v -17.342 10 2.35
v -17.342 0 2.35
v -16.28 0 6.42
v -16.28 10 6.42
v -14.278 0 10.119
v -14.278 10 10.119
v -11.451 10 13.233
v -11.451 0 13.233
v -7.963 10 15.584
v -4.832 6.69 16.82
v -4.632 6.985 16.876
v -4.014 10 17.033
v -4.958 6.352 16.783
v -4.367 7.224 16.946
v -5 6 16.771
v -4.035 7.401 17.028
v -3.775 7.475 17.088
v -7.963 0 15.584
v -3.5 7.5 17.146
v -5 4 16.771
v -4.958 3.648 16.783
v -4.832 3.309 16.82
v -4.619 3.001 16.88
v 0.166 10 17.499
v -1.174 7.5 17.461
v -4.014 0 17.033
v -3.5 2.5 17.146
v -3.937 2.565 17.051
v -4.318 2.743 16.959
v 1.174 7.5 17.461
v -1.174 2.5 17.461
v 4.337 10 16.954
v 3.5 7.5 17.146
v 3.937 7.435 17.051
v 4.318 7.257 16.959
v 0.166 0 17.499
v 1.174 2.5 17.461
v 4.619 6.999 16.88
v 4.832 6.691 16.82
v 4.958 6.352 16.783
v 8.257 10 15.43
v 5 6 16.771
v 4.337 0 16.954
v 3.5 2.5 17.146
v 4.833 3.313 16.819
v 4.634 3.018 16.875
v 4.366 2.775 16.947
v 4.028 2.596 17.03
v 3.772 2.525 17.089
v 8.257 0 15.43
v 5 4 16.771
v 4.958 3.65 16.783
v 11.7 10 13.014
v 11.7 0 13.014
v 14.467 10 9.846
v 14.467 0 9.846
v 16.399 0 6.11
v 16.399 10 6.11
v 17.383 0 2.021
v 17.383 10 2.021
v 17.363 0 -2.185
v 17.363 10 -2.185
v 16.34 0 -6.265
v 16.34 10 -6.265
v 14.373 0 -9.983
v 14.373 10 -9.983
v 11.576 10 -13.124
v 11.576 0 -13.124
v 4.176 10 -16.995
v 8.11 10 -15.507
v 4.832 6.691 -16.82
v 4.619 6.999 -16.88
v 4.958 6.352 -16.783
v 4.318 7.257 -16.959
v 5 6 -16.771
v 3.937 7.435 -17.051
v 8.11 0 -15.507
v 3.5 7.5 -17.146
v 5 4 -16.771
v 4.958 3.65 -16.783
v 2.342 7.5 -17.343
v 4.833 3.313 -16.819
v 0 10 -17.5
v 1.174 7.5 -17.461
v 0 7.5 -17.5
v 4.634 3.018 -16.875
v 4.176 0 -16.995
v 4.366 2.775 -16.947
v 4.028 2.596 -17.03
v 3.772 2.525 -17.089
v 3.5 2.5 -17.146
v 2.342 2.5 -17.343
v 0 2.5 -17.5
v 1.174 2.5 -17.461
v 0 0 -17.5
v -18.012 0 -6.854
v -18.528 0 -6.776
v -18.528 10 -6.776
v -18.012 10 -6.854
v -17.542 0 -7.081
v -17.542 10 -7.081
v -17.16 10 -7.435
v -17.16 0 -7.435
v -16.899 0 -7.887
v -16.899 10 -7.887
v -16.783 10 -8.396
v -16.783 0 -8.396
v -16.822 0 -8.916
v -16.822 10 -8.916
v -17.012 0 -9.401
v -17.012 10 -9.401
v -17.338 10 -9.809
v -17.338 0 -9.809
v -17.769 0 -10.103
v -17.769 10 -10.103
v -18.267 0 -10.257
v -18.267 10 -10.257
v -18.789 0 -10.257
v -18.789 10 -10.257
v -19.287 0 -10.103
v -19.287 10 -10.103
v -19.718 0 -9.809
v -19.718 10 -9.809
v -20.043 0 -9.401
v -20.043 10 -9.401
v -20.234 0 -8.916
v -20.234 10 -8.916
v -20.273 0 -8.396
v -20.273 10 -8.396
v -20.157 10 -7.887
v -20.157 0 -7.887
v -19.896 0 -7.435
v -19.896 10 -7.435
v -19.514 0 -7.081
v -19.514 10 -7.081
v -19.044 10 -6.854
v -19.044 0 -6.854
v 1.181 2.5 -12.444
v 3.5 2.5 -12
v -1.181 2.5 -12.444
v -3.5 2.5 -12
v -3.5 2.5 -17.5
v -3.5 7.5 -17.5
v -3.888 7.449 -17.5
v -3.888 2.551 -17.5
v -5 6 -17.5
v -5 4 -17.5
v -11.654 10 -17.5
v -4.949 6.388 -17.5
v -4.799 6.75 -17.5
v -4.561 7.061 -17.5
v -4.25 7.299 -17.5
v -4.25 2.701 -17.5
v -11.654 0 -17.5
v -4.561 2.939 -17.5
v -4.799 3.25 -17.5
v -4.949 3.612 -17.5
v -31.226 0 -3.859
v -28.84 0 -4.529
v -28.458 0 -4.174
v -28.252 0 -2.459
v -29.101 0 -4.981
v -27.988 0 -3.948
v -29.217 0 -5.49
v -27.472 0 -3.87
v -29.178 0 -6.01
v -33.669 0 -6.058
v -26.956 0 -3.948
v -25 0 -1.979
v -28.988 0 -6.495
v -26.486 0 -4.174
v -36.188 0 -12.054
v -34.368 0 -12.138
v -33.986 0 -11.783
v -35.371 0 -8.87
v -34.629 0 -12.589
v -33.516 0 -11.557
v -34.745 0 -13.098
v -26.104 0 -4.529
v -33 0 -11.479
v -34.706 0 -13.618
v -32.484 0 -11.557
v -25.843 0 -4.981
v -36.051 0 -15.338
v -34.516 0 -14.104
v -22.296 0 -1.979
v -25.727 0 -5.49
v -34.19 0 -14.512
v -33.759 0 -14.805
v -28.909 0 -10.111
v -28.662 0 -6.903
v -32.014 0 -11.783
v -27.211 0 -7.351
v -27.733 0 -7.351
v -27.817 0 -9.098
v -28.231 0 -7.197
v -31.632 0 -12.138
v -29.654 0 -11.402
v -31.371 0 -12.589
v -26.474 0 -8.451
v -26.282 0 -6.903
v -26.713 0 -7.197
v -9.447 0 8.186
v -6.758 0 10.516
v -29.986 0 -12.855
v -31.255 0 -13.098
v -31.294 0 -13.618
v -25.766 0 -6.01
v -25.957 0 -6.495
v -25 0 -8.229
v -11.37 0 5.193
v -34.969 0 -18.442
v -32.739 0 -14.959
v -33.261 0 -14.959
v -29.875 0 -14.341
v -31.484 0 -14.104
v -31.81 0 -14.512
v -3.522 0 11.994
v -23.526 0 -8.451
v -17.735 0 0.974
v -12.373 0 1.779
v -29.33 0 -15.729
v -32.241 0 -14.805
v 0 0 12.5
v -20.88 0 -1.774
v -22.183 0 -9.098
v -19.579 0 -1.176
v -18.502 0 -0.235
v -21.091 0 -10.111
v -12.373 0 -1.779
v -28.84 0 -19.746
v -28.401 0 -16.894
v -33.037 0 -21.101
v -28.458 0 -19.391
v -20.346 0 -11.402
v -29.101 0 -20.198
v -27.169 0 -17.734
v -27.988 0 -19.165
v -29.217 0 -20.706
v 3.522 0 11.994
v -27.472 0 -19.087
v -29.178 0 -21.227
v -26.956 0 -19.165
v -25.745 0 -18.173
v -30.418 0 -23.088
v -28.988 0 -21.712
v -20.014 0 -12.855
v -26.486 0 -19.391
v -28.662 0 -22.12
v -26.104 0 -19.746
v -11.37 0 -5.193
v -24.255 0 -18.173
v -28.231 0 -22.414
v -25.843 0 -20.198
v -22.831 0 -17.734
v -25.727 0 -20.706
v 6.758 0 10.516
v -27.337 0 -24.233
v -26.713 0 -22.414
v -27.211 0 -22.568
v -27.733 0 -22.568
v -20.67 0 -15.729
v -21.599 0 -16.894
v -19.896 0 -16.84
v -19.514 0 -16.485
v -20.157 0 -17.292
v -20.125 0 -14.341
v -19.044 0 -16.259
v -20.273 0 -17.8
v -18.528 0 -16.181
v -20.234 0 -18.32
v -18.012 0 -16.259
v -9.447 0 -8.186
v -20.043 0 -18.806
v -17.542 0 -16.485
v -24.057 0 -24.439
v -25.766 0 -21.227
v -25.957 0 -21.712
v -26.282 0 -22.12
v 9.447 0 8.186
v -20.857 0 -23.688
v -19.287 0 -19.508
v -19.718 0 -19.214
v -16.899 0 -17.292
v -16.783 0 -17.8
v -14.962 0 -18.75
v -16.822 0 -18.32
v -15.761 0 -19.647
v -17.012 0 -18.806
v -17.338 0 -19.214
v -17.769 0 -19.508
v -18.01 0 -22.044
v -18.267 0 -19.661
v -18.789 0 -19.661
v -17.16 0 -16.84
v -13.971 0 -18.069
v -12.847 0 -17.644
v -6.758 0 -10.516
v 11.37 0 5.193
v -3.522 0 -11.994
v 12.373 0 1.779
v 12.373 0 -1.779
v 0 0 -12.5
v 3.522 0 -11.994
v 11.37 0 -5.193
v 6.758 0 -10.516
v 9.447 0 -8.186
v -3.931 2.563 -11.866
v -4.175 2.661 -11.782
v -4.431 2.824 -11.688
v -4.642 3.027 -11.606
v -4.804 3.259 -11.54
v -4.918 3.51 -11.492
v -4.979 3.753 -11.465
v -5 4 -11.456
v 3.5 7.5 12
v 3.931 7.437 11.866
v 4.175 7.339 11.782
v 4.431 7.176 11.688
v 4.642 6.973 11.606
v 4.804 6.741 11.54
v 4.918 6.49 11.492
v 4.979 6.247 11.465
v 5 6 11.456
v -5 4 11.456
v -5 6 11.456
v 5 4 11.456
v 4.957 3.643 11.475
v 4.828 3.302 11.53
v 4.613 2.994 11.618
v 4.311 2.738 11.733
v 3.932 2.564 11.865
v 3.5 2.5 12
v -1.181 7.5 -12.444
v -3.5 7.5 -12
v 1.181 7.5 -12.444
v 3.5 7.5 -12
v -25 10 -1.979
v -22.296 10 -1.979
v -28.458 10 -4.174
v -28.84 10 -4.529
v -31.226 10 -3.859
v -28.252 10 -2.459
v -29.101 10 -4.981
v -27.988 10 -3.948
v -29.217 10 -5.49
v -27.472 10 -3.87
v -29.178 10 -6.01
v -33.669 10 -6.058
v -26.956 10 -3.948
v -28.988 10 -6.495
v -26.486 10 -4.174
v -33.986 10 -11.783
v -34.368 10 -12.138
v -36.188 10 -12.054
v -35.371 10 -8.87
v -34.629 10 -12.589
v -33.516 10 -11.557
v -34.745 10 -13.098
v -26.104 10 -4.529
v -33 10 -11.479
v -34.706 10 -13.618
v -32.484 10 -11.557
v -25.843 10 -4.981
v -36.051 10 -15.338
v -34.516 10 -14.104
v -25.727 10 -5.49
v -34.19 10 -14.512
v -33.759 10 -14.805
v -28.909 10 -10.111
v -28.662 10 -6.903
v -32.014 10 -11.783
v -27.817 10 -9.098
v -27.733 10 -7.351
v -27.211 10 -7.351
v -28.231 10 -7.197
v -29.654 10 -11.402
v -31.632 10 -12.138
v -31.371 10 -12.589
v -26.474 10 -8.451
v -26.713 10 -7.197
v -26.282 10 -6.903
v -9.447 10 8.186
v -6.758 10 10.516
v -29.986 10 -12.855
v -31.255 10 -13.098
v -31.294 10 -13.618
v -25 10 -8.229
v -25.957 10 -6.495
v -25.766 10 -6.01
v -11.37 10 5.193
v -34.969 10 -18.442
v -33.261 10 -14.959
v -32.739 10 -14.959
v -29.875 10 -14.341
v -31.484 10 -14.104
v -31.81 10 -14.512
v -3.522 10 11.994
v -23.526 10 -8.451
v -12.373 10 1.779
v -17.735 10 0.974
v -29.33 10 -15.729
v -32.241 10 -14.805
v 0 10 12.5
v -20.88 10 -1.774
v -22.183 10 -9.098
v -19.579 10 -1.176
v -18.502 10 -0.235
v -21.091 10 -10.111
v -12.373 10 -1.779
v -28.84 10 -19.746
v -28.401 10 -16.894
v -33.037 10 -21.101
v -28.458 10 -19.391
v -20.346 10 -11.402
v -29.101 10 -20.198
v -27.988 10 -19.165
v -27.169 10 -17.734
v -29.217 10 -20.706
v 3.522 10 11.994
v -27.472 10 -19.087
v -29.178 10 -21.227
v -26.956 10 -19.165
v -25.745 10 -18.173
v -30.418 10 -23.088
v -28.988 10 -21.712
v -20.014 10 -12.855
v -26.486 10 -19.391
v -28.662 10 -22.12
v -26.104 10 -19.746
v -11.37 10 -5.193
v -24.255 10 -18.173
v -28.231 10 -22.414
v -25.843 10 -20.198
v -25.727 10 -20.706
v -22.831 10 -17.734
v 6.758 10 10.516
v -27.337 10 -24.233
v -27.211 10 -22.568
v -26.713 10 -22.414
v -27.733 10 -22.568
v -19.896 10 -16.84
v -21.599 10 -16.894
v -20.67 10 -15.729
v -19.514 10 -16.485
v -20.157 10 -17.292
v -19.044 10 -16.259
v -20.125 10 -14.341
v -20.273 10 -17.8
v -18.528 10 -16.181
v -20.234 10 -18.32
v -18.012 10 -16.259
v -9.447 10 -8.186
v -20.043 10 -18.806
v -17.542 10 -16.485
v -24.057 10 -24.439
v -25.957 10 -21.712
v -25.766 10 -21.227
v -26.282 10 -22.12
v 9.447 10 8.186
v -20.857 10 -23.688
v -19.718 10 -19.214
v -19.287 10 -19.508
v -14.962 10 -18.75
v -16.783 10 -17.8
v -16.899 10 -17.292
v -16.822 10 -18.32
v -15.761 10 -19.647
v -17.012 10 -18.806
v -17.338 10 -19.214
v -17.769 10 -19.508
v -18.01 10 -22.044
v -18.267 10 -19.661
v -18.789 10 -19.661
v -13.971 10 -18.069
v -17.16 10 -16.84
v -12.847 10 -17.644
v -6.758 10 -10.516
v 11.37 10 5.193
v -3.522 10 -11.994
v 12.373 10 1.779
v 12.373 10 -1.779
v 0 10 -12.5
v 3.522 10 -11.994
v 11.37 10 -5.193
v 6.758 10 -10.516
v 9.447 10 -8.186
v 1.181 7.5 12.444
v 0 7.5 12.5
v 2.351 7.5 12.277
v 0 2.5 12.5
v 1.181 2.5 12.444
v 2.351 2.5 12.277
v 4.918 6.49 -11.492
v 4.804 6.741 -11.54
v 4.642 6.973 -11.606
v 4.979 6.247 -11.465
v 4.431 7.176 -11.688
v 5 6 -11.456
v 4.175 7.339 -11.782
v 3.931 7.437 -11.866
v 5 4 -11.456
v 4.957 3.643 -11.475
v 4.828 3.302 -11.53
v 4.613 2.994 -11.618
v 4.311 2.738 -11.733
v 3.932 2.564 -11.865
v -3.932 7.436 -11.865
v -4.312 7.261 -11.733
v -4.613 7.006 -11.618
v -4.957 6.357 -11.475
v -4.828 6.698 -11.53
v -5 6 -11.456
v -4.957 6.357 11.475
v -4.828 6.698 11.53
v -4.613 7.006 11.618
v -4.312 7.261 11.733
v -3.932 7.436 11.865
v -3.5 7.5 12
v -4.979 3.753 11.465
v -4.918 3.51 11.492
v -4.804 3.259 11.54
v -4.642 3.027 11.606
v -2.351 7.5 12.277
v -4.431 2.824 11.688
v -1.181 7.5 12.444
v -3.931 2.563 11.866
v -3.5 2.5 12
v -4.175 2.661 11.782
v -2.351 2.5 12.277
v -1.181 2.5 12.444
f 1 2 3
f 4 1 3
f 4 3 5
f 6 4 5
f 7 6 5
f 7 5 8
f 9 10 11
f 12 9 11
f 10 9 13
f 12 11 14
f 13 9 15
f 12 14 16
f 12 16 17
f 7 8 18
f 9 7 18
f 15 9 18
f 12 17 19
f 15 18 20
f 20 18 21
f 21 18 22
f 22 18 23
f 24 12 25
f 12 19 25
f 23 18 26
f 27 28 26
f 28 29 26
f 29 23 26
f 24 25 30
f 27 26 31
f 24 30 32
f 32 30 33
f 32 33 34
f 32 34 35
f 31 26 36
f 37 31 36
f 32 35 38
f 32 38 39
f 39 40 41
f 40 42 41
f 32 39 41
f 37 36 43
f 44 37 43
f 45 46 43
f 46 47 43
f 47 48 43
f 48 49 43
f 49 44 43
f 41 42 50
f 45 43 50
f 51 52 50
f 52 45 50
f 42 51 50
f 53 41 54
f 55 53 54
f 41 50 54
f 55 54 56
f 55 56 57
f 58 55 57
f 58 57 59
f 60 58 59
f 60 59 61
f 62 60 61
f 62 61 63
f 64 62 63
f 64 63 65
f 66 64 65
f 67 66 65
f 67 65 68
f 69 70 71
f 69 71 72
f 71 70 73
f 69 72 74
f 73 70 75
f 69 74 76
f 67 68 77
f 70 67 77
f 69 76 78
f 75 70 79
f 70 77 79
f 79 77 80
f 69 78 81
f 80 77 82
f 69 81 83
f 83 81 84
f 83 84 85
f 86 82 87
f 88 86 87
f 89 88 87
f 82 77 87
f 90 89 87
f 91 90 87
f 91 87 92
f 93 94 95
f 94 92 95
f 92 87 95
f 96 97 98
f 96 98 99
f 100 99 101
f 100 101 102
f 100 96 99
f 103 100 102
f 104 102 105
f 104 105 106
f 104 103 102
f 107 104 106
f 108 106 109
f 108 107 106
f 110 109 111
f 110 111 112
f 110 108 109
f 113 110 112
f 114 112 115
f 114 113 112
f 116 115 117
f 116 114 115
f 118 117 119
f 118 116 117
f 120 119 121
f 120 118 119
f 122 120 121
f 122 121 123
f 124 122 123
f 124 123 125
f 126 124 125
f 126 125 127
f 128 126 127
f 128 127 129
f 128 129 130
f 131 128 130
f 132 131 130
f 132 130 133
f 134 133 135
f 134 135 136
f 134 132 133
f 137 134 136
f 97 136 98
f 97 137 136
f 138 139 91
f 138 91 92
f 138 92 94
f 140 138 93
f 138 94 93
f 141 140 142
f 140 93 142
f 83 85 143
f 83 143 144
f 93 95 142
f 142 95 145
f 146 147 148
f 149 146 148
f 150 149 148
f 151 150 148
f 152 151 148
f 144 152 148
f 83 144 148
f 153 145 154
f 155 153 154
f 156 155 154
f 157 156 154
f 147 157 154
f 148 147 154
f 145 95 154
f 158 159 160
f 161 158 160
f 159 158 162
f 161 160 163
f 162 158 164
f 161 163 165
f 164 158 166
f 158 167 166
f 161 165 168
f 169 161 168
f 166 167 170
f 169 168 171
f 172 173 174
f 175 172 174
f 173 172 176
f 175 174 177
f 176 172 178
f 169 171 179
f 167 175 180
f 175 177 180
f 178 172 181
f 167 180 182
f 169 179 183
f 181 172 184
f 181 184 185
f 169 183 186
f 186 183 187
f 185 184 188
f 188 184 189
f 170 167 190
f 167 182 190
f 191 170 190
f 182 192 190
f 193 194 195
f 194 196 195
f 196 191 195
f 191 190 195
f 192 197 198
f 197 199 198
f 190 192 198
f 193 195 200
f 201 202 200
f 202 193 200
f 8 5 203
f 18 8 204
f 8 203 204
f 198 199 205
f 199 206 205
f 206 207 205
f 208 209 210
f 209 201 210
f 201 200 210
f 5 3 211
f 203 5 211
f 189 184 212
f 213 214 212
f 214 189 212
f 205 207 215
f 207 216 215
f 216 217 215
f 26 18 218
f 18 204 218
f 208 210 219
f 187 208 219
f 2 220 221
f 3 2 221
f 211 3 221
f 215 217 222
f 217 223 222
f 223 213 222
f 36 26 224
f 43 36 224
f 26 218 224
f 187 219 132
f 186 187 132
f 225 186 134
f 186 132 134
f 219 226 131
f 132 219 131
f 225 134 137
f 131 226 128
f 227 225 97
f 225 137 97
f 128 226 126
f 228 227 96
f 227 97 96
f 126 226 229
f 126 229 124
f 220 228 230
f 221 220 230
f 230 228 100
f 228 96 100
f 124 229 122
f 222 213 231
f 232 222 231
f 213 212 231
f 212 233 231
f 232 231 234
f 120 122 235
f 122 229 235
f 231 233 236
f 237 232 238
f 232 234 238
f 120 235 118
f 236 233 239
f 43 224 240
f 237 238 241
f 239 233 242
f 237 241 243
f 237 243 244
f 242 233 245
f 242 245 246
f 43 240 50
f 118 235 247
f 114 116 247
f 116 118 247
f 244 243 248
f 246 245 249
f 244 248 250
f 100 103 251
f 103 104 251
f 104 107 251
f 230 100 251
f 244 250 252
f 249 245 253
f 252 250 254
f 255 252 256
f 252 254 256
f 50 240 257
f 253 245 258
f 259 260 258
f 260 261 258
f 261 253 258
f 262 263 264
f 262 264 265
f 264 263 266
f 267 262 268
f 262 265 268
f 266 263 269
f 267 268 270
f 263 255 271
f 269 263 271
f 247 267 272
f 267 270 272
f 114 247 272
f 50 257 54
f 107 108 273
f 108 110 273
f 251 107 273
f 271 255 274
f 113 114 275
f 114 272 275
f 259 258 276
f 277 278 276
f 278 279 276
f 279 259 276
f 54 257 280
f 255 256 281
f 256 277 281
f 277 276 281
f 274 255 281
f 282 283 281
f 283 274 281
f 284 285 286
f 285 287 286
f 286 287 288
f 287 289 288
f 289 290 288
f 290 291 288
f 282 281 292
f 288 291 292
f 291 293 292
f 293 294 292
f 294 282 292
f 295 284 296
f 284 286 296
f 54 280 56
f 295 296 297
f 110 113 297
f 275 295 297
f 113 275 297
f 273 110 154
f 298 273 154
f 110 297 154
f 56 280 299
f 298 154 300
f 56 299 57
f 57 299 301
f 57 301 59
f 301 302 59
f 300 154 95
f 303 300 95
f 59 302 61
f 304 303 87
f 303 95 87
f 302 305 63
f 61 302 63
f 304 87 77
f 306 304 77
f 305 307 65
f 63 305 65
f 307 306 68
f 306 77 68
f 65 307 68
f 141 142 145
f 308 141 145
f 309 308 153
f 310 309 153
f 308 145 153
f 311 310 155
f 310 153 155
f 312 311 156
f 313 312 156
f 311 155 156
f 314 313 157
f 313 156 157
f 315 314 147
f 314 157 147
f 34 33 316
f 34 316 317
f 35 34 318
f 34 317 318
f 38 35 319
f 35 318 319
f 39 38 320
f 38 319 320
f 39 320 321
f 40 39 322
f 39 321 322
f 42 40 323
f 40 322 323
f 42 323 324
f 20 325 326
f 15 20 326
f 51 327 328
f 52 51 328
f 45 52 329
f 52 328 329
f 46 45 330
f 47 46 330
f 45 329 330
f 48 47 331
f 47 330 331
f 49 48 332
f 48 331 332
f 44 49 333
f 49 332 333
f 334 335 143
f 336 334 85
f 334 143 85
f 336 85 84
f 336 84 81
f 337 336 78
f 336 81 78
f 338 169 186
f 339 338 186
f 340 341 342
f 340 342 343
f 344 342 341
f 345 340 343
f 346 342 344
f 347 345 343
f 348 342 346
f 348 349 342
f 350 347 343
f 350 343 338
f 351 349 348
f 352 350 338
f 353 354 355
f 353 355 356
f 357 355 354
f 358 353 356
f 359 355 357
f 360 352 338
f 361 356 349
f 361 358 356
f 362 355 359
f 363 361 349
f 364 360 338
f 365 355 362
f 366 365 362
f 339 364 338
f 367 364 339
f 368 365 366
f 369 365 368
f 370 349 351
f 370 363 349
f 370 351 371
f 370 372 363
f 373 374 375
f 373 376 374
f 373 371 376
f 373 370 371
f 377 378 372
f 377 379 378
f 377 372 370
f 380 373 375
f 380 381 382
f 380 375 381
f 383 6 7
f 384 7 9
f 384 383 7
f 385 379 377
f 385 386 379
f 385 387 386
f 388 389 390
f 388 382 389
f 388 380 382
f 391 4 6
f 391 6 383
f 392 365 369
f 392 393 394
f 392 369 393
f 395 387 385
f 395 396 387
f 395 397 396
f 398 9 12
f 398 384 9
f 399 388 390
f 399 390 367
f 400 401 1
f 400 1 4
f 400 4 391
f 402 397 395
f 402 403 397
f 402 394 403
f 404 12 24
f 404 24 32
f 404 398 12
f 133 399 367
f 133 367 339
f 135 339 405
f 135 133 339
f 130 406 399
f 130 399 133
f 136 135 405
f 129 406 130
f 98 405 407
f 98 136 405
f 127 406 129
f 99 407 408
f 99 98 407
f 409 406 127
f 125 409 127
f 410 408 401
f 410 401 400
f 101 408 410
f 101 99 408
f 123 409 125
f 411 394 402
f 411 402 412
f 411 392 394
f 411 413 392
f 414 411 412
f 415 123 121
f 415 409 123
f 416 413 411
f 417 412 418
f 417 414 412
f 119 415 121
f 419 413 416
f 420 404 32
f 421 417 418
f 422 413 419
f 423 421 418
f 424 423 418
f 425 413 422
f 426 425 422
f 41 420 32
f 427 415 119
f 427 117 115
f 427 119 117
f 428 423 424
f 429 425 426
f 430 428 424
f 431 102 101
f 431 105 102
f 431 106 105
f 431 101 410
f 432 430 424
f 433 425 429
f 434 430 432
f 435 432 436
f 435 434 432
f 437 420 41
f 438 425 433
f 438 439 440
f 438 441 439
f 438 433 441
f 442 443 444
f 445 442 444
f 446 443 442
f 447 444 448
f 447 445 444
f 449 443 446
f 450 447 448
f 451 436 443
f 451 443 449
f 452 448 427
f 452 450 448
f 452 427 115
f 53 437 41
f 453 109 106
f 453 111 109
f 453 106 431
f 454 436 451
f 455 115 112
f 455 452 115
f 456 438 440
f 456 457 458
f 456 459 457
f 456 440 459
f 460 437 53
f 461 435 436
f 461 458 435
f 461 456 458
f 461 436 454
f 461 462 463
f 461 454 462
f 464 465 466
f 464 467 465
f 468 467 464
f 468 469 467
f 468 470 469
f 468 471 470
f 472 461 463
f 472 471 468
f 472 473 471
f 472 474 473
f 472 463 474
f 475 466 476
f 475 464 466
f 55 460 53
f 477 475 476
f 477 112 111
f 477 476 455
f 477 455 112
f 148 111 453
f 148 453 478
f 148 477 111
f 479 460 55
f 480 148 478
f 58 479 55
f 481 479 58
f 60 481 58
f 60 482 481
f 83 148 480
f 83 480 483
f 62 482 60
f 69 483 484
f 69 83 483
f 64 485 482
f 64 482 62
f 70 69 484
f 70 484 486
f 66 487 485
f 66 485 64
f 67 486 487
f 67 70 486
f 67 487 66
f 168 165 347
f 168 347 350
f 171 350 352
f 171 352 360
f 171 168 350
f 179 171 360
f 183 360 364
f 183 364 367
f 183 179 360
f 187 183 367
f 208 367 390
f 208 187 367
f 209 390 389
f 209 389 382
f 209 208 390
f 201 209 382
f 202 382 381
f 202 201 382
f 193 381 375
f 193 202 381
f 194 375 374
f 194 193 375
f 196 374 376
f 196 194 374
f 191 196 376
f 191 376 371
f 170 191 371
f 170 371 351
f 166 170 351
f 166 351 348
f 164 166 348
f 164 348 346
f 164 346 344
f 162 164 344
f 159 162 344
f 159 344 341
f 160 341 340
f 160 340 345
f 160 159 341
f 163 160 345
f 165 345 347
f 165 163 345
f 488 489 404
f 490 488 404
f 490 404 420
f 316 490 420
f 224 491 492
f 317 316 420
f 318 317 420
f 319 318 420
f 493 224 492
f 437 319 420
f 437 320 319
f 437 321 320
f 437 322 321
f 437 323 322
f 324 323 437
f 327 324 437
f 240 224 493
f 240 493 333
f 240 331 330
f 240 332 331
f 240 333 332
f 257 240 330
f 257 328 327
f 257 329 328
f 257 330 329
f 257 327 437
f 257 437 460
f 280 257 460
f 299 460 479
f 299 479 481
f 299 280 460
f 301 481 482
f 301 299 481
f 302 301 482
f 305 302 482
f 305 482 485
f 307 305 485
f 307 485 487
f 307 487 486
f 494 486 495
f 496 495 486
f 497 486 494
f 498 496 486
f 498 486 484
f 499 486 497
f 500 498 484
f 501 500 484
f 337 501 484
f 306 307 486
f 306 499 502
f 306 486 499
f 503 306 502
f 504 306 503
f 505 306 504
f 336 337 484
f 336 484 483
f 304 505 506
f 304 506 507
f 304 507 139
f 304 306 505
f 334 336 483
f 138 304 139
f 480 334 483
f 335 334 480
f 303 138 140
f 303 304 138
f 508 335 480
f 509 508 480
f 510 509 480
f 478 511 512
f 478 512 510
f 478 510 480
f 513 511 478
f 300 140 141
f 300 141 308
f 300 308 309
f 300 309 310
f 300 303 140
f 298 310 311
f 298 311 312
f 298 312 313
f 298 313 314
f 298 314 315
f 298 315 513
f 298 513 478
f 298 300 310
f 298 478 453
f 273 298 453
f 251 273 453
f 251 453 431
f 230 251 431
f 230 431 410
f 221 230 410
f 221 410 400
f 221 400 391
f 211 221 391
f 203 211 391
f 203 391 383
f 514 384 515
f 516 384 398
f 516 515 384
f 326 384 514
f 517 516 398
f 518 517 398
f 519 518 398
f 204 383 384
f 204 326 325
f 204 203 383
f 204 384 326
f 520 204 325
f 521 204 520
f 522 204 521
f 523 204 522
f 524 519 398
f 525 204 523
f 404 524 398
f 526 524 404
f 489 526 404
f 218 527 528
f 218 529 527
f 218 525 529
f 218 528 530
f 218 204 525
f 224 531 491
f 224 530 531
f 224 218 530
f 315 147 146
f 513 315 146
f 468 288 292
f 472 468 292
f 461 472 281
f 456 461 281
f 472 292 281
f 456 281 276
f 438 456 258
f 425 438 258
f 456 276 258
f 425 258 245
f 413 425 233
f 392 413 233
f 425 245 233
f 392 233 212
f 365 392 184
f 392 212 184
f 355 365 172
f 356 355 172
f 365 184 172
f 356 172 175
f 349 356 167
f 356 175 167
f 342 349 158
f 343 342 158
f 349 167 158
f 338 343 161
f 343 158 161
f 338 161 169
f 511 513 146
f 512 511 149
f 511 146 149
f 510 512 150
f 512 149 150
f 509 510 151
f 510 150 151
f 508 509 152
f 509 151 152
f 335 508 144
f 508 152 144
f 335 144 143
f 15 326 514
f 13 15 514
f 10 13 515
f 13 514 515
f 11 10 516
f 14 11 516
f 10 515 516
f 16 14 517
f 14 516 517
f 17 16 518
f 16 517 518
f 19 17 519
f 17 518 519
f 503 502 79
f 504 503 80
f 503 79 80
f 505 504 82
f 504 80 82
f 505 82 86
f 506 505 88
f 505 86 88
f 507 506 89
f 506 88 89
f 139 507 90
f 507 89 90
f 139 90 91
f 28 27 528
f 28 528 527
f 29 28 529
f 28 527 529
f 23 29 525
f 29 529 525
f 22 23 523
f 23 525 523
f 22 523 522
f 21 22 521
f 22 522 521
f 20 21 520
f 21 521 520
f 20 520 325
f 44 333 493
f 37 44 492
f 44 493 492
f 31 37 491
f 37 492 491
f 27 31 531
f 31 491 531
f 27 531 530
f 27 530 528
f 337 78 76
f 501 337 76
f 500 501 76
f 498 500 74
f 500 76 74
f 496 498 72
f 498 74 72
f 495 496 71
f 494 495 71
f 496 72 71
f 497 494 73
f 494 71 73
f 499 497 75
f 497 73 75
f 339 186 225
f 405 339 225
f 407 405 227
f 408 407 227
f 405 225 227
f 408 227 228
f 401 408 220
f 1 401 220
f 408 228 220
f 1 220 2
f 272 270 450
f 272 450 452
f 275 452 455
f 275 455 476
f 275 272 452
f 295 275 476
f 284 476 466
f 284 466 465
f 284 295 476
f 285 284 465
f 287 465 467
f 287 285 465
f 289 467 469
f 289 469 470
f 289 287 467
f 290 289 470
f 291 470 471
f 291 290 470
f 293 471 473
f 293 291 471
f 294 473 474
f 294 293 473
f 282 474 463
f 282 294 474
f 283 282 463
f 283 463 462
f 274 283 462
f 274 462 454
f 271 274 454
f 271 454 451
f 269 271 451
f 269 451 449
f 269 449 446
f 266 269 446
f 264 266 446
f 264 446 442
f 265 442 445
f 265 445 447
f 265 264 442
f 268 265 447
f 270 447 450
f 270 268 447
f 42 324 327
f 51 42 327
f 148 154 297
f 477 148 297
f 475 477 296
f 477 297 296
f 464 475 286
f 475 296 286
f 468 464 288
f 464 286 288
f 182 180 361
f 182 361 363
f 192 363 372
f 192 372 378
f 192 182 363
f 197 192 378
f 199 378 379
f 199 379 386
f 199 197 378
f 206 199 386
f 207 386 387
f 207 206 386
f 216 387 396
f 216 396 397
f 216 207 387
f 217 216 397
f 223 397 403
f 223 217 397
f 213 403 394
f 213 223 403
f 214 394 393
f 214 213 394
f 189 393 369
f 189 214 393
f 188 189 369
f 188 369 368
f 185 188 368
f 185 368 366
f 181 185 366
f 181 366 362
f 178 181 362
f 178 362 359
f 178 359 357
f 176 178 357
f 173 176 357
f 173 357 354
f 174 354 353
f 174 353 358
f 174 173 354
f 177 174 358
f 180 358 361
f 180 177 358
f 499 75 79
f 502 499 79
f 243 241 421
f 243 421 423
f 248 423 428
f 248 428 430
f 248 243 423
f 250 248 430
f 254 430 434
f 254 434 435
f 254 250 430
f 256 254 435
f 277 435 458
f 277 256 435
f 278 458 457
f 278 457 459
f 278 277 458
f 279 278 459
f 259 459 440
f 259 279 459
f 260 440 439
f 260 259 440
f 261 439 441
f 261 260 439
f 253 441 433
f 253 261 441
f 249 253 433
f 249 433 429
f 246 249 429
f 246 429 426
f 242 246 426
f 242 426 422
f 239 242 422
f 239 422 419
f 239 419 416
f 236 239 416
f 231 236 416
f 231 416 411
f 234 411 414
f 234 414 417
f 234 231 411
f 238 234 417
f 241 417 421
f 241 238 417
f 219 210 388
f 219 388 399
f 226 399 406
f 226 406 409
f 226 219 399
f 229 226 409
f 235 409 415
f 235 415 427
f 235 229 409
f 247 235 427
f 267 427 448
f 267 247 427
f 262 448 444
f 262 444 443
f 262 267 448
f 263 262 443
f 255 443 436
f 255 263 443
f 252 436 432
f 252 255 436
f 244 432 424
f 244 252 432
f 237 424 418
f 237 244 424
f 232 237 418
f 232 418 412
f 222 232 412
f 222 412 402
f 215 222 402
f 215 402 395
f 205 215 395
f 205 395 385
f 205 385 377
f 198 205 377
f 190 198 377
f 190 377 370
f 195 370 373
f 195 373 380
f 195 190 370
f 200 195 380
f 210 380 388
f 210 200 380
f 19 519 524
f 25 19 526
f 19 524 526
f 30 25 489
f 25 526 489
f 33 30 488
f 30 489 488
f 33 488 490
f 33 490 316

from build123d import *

# Parameters (mm, degrees)
SKETCH1_R               = 12.5
SKETCH1_R_2             = 5
SKETCH1_R_3             = 1.75
BOSS_EXTRUDE1_DEPTH     = 10
CUT_EXTRUDE1_DEPTH      = 45.869499914
CUT_EXTRUDE1_DEPTH_BACK = 45.869499914


with BuildPart() as part:
    # Sketch1 → Boss-Extrude1 (new body)
    with BuildSketch(Plane(origin=(0, 0, 0), x_dir=(1, 0, 0), z_dir=(0, 1, 0))):
        with BuildLine():
            Line((-25, 1.978756555), (-22.29623484, 1.978756555))
            ThreePointArc((-22.29623484, 1.978756555), (-19.006625225, 0.744187285), (-17.341515987, -2.349856013))
            ThreePointArc((-17.341515987, -2.349856013), (13.179007554, -11.513633653), (0, 17.5))
            Line((0, 17.5), (-11.654343591, 17.5))
            ThreePointArc((-11.654343591, 17.5), (-13.971297253, 18.069229669), (-15.760699409, 19.647309709))
            ThreePointArc((-15.760699409, 19.647309709), (-34.969233245, 18.441902296), (-25, 1.978756555))
        make_face()
        with Locations(Location((0, 0, 0), (0, 0, 270))):
            Circle(SKETCH1_R, mode=Mode.SUBTRACT)
        with Locations(Location((-25, 13.228756555, 0), (0, 0, 270))):
            Circle(SKETCH1_R_2, mode=Mode.SUBTRACT)
        with Locations(Location((-33, 13.228756555, 0), (0, 0, 270))):
            Circle(SKETCH1_R_3, mode=Mode.SUBTRACT)
        with Locations(Location((-27.472135955, 20.837208686, 0), (0, 0, 270))):
            Circle(SKETCH1_R_3, mode=Mode.SUBTRACT)
        with Locations(Location((-18.527864045, 17.931038574, 0), (0, 0, 270))):
            Circle(SKETCH1_R_3, mode=Mode.SUBTRACT)
        with Locations(Location((-18.527864045, 8.526474537, 0), (0, 0, 270))):
            Circle(SKETCH1_R_3, mode=Mode.SUBTRACT)
        with Locations(Location((-27.472135955, 5.620304425, 0), (0, 0, 270))):
            Circle(SKETCH1_R_3, mode=Mode.SUBTRACT)
    extrude(amount=BOSS_EXTRUDE1_DEPTH)

    # Sketch2 → Cut-Extrude1 (cut, two sides: drawn at the far end of the back side and taken through both)
    with BuildSketch(Plane.XY.offset(-CUT_EXTRUDE1_DEPTH_BACK)):
        with BuildLine():
            Line((-3.5, 7.5), (3.5, 7.5))
            ThreePointArc((3.5, 7.5), (4.560660172, 7.060660172), (5, 6))
            Line((5, 6), (5, 4))
            ThreePointArc((5, 4), (4.560660172, 2.939339828), (3.5, 2.5))
            Line((3.5, 2.5), (-3.5, 2.5))
            ThreePointArc((-3.5, 2.5), (-4.560660172, 2.939339828), (-5, 4))
            Line((-5, 4), (-5, 6))
            ThreePointArc((-5, 6), (-4.560660172, 7.060660172), (-3.5, 7.5))
        make_face()
    extrude(amount=CUT_EXTRUDE1_DEPTH + CUT_EXTRUDE1_DEPTH_BACK, mode=Mode.SUBTRACT)


solid = part.part
